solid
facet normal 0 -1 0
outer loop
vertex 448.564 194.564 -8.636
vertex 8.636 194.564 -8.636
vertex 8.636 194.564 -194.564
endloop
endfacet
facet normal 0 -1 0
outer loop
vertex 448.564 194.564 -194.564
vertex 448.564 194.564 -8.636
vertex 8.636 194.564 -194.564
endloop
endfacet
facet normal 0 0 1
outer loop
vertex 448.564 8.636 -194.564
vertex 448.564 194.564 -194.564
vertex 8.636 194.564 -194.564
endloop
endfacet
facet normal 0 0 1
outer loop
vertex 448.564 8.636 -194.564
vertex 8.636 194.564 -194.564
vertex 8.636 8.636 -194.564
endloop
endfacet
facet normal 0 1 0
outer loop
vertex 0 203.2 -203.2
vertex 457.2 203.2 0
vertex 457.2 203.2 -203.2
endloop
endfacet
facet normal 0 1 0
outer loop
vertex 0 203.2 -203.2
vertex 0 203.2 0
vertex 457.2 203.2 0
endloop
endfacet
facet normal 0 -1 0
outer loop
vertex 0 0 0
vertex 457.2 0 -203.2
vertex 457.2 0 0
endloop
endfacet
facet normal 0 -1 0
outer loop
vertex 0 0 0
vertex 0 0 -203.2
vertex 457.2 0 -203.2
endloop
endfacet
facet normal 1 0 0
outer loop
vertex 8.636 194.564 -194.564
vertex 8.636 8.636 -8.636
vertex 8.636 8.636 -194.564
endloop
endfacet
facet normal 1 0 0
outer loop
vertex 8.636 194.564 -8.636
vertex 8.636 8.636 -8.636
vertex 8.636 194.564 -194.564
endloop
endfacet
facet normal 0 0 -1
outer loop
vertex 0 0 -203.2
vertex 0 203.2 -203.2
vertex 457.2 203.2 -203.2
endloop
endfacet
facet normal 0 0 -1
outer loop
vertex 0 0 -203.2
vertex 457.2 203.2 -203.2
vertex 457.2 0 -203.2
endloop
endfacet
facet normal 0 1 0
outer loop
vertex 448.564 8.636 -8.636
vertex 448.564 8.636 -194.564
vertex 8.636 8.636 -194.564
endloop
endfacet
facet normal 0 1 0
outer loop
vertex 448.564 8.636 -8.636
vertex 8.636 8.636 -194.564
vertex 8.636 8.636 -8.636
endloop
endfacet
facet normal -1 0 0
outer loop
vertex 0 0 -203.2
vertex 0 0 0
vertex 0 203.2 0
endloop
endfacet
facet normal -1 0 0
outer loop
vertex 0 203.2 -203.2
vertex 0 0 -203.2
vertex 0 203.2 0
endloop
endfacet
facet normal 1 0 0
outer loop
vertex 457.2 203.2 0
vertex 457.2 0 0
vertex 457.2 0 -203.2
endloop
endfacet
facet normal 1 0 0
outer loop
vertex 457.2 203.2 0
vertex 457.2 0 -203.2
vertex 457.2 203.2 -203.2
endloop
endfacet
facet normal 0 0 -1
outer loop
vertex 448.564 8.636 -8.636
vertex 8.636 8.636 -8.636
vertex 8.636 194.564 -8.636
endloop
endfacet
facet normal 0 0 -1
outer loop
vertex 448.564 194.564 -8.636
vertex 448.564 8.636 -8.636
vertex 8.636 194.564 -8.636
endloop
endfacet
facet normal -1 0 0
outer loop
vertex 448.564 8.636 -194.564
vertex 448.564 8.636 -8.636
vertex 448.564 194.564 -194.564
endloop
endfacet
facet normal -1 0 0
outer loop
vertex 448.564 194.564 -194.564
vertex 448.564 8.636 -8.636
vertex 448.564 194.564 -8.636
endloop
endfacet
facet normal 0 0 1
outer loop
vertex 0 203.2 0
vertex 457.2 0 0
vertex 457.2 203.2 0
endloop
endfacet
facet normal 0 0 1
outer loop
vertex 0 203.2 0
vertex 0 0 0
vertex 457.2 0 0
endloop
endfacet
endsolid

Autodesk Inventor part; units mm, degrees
ref_plane "YZ Plane" through (0, 0, 0) normal (1, 0, 0) x (0, 1, 0)
ref_plane "XZ Plane" through (0, 0, 0) normal (0, 1, 0) x (-1, 0, 0)
ref_plane "XY Plane" through (0, 0, 0) normal (0, 0, 1) x (1, 0, 0)
sketch "Sketch1" plane through (0, 0, 0) normal (1, 0, 0) x (0, 1, 0)
  line L0 (0, 0) -> (203.2, 0)
  line L1 (203.2, 0) -> (203.2, -203.2)
  line L2 (203.2, -203.2) -> (0, -203.2)
  line L3 (0, -203.2) -> (0, 0)
  dimension "d0" = 203.2
  dimension "d1" = 203.2
extrude "Extrusion1" add sketch "Sketch1" along normal blind 457.2
shell "Shell1" thickness 8.636 removed faces 0
properties part number "CinderBlock" material "Concrete"
